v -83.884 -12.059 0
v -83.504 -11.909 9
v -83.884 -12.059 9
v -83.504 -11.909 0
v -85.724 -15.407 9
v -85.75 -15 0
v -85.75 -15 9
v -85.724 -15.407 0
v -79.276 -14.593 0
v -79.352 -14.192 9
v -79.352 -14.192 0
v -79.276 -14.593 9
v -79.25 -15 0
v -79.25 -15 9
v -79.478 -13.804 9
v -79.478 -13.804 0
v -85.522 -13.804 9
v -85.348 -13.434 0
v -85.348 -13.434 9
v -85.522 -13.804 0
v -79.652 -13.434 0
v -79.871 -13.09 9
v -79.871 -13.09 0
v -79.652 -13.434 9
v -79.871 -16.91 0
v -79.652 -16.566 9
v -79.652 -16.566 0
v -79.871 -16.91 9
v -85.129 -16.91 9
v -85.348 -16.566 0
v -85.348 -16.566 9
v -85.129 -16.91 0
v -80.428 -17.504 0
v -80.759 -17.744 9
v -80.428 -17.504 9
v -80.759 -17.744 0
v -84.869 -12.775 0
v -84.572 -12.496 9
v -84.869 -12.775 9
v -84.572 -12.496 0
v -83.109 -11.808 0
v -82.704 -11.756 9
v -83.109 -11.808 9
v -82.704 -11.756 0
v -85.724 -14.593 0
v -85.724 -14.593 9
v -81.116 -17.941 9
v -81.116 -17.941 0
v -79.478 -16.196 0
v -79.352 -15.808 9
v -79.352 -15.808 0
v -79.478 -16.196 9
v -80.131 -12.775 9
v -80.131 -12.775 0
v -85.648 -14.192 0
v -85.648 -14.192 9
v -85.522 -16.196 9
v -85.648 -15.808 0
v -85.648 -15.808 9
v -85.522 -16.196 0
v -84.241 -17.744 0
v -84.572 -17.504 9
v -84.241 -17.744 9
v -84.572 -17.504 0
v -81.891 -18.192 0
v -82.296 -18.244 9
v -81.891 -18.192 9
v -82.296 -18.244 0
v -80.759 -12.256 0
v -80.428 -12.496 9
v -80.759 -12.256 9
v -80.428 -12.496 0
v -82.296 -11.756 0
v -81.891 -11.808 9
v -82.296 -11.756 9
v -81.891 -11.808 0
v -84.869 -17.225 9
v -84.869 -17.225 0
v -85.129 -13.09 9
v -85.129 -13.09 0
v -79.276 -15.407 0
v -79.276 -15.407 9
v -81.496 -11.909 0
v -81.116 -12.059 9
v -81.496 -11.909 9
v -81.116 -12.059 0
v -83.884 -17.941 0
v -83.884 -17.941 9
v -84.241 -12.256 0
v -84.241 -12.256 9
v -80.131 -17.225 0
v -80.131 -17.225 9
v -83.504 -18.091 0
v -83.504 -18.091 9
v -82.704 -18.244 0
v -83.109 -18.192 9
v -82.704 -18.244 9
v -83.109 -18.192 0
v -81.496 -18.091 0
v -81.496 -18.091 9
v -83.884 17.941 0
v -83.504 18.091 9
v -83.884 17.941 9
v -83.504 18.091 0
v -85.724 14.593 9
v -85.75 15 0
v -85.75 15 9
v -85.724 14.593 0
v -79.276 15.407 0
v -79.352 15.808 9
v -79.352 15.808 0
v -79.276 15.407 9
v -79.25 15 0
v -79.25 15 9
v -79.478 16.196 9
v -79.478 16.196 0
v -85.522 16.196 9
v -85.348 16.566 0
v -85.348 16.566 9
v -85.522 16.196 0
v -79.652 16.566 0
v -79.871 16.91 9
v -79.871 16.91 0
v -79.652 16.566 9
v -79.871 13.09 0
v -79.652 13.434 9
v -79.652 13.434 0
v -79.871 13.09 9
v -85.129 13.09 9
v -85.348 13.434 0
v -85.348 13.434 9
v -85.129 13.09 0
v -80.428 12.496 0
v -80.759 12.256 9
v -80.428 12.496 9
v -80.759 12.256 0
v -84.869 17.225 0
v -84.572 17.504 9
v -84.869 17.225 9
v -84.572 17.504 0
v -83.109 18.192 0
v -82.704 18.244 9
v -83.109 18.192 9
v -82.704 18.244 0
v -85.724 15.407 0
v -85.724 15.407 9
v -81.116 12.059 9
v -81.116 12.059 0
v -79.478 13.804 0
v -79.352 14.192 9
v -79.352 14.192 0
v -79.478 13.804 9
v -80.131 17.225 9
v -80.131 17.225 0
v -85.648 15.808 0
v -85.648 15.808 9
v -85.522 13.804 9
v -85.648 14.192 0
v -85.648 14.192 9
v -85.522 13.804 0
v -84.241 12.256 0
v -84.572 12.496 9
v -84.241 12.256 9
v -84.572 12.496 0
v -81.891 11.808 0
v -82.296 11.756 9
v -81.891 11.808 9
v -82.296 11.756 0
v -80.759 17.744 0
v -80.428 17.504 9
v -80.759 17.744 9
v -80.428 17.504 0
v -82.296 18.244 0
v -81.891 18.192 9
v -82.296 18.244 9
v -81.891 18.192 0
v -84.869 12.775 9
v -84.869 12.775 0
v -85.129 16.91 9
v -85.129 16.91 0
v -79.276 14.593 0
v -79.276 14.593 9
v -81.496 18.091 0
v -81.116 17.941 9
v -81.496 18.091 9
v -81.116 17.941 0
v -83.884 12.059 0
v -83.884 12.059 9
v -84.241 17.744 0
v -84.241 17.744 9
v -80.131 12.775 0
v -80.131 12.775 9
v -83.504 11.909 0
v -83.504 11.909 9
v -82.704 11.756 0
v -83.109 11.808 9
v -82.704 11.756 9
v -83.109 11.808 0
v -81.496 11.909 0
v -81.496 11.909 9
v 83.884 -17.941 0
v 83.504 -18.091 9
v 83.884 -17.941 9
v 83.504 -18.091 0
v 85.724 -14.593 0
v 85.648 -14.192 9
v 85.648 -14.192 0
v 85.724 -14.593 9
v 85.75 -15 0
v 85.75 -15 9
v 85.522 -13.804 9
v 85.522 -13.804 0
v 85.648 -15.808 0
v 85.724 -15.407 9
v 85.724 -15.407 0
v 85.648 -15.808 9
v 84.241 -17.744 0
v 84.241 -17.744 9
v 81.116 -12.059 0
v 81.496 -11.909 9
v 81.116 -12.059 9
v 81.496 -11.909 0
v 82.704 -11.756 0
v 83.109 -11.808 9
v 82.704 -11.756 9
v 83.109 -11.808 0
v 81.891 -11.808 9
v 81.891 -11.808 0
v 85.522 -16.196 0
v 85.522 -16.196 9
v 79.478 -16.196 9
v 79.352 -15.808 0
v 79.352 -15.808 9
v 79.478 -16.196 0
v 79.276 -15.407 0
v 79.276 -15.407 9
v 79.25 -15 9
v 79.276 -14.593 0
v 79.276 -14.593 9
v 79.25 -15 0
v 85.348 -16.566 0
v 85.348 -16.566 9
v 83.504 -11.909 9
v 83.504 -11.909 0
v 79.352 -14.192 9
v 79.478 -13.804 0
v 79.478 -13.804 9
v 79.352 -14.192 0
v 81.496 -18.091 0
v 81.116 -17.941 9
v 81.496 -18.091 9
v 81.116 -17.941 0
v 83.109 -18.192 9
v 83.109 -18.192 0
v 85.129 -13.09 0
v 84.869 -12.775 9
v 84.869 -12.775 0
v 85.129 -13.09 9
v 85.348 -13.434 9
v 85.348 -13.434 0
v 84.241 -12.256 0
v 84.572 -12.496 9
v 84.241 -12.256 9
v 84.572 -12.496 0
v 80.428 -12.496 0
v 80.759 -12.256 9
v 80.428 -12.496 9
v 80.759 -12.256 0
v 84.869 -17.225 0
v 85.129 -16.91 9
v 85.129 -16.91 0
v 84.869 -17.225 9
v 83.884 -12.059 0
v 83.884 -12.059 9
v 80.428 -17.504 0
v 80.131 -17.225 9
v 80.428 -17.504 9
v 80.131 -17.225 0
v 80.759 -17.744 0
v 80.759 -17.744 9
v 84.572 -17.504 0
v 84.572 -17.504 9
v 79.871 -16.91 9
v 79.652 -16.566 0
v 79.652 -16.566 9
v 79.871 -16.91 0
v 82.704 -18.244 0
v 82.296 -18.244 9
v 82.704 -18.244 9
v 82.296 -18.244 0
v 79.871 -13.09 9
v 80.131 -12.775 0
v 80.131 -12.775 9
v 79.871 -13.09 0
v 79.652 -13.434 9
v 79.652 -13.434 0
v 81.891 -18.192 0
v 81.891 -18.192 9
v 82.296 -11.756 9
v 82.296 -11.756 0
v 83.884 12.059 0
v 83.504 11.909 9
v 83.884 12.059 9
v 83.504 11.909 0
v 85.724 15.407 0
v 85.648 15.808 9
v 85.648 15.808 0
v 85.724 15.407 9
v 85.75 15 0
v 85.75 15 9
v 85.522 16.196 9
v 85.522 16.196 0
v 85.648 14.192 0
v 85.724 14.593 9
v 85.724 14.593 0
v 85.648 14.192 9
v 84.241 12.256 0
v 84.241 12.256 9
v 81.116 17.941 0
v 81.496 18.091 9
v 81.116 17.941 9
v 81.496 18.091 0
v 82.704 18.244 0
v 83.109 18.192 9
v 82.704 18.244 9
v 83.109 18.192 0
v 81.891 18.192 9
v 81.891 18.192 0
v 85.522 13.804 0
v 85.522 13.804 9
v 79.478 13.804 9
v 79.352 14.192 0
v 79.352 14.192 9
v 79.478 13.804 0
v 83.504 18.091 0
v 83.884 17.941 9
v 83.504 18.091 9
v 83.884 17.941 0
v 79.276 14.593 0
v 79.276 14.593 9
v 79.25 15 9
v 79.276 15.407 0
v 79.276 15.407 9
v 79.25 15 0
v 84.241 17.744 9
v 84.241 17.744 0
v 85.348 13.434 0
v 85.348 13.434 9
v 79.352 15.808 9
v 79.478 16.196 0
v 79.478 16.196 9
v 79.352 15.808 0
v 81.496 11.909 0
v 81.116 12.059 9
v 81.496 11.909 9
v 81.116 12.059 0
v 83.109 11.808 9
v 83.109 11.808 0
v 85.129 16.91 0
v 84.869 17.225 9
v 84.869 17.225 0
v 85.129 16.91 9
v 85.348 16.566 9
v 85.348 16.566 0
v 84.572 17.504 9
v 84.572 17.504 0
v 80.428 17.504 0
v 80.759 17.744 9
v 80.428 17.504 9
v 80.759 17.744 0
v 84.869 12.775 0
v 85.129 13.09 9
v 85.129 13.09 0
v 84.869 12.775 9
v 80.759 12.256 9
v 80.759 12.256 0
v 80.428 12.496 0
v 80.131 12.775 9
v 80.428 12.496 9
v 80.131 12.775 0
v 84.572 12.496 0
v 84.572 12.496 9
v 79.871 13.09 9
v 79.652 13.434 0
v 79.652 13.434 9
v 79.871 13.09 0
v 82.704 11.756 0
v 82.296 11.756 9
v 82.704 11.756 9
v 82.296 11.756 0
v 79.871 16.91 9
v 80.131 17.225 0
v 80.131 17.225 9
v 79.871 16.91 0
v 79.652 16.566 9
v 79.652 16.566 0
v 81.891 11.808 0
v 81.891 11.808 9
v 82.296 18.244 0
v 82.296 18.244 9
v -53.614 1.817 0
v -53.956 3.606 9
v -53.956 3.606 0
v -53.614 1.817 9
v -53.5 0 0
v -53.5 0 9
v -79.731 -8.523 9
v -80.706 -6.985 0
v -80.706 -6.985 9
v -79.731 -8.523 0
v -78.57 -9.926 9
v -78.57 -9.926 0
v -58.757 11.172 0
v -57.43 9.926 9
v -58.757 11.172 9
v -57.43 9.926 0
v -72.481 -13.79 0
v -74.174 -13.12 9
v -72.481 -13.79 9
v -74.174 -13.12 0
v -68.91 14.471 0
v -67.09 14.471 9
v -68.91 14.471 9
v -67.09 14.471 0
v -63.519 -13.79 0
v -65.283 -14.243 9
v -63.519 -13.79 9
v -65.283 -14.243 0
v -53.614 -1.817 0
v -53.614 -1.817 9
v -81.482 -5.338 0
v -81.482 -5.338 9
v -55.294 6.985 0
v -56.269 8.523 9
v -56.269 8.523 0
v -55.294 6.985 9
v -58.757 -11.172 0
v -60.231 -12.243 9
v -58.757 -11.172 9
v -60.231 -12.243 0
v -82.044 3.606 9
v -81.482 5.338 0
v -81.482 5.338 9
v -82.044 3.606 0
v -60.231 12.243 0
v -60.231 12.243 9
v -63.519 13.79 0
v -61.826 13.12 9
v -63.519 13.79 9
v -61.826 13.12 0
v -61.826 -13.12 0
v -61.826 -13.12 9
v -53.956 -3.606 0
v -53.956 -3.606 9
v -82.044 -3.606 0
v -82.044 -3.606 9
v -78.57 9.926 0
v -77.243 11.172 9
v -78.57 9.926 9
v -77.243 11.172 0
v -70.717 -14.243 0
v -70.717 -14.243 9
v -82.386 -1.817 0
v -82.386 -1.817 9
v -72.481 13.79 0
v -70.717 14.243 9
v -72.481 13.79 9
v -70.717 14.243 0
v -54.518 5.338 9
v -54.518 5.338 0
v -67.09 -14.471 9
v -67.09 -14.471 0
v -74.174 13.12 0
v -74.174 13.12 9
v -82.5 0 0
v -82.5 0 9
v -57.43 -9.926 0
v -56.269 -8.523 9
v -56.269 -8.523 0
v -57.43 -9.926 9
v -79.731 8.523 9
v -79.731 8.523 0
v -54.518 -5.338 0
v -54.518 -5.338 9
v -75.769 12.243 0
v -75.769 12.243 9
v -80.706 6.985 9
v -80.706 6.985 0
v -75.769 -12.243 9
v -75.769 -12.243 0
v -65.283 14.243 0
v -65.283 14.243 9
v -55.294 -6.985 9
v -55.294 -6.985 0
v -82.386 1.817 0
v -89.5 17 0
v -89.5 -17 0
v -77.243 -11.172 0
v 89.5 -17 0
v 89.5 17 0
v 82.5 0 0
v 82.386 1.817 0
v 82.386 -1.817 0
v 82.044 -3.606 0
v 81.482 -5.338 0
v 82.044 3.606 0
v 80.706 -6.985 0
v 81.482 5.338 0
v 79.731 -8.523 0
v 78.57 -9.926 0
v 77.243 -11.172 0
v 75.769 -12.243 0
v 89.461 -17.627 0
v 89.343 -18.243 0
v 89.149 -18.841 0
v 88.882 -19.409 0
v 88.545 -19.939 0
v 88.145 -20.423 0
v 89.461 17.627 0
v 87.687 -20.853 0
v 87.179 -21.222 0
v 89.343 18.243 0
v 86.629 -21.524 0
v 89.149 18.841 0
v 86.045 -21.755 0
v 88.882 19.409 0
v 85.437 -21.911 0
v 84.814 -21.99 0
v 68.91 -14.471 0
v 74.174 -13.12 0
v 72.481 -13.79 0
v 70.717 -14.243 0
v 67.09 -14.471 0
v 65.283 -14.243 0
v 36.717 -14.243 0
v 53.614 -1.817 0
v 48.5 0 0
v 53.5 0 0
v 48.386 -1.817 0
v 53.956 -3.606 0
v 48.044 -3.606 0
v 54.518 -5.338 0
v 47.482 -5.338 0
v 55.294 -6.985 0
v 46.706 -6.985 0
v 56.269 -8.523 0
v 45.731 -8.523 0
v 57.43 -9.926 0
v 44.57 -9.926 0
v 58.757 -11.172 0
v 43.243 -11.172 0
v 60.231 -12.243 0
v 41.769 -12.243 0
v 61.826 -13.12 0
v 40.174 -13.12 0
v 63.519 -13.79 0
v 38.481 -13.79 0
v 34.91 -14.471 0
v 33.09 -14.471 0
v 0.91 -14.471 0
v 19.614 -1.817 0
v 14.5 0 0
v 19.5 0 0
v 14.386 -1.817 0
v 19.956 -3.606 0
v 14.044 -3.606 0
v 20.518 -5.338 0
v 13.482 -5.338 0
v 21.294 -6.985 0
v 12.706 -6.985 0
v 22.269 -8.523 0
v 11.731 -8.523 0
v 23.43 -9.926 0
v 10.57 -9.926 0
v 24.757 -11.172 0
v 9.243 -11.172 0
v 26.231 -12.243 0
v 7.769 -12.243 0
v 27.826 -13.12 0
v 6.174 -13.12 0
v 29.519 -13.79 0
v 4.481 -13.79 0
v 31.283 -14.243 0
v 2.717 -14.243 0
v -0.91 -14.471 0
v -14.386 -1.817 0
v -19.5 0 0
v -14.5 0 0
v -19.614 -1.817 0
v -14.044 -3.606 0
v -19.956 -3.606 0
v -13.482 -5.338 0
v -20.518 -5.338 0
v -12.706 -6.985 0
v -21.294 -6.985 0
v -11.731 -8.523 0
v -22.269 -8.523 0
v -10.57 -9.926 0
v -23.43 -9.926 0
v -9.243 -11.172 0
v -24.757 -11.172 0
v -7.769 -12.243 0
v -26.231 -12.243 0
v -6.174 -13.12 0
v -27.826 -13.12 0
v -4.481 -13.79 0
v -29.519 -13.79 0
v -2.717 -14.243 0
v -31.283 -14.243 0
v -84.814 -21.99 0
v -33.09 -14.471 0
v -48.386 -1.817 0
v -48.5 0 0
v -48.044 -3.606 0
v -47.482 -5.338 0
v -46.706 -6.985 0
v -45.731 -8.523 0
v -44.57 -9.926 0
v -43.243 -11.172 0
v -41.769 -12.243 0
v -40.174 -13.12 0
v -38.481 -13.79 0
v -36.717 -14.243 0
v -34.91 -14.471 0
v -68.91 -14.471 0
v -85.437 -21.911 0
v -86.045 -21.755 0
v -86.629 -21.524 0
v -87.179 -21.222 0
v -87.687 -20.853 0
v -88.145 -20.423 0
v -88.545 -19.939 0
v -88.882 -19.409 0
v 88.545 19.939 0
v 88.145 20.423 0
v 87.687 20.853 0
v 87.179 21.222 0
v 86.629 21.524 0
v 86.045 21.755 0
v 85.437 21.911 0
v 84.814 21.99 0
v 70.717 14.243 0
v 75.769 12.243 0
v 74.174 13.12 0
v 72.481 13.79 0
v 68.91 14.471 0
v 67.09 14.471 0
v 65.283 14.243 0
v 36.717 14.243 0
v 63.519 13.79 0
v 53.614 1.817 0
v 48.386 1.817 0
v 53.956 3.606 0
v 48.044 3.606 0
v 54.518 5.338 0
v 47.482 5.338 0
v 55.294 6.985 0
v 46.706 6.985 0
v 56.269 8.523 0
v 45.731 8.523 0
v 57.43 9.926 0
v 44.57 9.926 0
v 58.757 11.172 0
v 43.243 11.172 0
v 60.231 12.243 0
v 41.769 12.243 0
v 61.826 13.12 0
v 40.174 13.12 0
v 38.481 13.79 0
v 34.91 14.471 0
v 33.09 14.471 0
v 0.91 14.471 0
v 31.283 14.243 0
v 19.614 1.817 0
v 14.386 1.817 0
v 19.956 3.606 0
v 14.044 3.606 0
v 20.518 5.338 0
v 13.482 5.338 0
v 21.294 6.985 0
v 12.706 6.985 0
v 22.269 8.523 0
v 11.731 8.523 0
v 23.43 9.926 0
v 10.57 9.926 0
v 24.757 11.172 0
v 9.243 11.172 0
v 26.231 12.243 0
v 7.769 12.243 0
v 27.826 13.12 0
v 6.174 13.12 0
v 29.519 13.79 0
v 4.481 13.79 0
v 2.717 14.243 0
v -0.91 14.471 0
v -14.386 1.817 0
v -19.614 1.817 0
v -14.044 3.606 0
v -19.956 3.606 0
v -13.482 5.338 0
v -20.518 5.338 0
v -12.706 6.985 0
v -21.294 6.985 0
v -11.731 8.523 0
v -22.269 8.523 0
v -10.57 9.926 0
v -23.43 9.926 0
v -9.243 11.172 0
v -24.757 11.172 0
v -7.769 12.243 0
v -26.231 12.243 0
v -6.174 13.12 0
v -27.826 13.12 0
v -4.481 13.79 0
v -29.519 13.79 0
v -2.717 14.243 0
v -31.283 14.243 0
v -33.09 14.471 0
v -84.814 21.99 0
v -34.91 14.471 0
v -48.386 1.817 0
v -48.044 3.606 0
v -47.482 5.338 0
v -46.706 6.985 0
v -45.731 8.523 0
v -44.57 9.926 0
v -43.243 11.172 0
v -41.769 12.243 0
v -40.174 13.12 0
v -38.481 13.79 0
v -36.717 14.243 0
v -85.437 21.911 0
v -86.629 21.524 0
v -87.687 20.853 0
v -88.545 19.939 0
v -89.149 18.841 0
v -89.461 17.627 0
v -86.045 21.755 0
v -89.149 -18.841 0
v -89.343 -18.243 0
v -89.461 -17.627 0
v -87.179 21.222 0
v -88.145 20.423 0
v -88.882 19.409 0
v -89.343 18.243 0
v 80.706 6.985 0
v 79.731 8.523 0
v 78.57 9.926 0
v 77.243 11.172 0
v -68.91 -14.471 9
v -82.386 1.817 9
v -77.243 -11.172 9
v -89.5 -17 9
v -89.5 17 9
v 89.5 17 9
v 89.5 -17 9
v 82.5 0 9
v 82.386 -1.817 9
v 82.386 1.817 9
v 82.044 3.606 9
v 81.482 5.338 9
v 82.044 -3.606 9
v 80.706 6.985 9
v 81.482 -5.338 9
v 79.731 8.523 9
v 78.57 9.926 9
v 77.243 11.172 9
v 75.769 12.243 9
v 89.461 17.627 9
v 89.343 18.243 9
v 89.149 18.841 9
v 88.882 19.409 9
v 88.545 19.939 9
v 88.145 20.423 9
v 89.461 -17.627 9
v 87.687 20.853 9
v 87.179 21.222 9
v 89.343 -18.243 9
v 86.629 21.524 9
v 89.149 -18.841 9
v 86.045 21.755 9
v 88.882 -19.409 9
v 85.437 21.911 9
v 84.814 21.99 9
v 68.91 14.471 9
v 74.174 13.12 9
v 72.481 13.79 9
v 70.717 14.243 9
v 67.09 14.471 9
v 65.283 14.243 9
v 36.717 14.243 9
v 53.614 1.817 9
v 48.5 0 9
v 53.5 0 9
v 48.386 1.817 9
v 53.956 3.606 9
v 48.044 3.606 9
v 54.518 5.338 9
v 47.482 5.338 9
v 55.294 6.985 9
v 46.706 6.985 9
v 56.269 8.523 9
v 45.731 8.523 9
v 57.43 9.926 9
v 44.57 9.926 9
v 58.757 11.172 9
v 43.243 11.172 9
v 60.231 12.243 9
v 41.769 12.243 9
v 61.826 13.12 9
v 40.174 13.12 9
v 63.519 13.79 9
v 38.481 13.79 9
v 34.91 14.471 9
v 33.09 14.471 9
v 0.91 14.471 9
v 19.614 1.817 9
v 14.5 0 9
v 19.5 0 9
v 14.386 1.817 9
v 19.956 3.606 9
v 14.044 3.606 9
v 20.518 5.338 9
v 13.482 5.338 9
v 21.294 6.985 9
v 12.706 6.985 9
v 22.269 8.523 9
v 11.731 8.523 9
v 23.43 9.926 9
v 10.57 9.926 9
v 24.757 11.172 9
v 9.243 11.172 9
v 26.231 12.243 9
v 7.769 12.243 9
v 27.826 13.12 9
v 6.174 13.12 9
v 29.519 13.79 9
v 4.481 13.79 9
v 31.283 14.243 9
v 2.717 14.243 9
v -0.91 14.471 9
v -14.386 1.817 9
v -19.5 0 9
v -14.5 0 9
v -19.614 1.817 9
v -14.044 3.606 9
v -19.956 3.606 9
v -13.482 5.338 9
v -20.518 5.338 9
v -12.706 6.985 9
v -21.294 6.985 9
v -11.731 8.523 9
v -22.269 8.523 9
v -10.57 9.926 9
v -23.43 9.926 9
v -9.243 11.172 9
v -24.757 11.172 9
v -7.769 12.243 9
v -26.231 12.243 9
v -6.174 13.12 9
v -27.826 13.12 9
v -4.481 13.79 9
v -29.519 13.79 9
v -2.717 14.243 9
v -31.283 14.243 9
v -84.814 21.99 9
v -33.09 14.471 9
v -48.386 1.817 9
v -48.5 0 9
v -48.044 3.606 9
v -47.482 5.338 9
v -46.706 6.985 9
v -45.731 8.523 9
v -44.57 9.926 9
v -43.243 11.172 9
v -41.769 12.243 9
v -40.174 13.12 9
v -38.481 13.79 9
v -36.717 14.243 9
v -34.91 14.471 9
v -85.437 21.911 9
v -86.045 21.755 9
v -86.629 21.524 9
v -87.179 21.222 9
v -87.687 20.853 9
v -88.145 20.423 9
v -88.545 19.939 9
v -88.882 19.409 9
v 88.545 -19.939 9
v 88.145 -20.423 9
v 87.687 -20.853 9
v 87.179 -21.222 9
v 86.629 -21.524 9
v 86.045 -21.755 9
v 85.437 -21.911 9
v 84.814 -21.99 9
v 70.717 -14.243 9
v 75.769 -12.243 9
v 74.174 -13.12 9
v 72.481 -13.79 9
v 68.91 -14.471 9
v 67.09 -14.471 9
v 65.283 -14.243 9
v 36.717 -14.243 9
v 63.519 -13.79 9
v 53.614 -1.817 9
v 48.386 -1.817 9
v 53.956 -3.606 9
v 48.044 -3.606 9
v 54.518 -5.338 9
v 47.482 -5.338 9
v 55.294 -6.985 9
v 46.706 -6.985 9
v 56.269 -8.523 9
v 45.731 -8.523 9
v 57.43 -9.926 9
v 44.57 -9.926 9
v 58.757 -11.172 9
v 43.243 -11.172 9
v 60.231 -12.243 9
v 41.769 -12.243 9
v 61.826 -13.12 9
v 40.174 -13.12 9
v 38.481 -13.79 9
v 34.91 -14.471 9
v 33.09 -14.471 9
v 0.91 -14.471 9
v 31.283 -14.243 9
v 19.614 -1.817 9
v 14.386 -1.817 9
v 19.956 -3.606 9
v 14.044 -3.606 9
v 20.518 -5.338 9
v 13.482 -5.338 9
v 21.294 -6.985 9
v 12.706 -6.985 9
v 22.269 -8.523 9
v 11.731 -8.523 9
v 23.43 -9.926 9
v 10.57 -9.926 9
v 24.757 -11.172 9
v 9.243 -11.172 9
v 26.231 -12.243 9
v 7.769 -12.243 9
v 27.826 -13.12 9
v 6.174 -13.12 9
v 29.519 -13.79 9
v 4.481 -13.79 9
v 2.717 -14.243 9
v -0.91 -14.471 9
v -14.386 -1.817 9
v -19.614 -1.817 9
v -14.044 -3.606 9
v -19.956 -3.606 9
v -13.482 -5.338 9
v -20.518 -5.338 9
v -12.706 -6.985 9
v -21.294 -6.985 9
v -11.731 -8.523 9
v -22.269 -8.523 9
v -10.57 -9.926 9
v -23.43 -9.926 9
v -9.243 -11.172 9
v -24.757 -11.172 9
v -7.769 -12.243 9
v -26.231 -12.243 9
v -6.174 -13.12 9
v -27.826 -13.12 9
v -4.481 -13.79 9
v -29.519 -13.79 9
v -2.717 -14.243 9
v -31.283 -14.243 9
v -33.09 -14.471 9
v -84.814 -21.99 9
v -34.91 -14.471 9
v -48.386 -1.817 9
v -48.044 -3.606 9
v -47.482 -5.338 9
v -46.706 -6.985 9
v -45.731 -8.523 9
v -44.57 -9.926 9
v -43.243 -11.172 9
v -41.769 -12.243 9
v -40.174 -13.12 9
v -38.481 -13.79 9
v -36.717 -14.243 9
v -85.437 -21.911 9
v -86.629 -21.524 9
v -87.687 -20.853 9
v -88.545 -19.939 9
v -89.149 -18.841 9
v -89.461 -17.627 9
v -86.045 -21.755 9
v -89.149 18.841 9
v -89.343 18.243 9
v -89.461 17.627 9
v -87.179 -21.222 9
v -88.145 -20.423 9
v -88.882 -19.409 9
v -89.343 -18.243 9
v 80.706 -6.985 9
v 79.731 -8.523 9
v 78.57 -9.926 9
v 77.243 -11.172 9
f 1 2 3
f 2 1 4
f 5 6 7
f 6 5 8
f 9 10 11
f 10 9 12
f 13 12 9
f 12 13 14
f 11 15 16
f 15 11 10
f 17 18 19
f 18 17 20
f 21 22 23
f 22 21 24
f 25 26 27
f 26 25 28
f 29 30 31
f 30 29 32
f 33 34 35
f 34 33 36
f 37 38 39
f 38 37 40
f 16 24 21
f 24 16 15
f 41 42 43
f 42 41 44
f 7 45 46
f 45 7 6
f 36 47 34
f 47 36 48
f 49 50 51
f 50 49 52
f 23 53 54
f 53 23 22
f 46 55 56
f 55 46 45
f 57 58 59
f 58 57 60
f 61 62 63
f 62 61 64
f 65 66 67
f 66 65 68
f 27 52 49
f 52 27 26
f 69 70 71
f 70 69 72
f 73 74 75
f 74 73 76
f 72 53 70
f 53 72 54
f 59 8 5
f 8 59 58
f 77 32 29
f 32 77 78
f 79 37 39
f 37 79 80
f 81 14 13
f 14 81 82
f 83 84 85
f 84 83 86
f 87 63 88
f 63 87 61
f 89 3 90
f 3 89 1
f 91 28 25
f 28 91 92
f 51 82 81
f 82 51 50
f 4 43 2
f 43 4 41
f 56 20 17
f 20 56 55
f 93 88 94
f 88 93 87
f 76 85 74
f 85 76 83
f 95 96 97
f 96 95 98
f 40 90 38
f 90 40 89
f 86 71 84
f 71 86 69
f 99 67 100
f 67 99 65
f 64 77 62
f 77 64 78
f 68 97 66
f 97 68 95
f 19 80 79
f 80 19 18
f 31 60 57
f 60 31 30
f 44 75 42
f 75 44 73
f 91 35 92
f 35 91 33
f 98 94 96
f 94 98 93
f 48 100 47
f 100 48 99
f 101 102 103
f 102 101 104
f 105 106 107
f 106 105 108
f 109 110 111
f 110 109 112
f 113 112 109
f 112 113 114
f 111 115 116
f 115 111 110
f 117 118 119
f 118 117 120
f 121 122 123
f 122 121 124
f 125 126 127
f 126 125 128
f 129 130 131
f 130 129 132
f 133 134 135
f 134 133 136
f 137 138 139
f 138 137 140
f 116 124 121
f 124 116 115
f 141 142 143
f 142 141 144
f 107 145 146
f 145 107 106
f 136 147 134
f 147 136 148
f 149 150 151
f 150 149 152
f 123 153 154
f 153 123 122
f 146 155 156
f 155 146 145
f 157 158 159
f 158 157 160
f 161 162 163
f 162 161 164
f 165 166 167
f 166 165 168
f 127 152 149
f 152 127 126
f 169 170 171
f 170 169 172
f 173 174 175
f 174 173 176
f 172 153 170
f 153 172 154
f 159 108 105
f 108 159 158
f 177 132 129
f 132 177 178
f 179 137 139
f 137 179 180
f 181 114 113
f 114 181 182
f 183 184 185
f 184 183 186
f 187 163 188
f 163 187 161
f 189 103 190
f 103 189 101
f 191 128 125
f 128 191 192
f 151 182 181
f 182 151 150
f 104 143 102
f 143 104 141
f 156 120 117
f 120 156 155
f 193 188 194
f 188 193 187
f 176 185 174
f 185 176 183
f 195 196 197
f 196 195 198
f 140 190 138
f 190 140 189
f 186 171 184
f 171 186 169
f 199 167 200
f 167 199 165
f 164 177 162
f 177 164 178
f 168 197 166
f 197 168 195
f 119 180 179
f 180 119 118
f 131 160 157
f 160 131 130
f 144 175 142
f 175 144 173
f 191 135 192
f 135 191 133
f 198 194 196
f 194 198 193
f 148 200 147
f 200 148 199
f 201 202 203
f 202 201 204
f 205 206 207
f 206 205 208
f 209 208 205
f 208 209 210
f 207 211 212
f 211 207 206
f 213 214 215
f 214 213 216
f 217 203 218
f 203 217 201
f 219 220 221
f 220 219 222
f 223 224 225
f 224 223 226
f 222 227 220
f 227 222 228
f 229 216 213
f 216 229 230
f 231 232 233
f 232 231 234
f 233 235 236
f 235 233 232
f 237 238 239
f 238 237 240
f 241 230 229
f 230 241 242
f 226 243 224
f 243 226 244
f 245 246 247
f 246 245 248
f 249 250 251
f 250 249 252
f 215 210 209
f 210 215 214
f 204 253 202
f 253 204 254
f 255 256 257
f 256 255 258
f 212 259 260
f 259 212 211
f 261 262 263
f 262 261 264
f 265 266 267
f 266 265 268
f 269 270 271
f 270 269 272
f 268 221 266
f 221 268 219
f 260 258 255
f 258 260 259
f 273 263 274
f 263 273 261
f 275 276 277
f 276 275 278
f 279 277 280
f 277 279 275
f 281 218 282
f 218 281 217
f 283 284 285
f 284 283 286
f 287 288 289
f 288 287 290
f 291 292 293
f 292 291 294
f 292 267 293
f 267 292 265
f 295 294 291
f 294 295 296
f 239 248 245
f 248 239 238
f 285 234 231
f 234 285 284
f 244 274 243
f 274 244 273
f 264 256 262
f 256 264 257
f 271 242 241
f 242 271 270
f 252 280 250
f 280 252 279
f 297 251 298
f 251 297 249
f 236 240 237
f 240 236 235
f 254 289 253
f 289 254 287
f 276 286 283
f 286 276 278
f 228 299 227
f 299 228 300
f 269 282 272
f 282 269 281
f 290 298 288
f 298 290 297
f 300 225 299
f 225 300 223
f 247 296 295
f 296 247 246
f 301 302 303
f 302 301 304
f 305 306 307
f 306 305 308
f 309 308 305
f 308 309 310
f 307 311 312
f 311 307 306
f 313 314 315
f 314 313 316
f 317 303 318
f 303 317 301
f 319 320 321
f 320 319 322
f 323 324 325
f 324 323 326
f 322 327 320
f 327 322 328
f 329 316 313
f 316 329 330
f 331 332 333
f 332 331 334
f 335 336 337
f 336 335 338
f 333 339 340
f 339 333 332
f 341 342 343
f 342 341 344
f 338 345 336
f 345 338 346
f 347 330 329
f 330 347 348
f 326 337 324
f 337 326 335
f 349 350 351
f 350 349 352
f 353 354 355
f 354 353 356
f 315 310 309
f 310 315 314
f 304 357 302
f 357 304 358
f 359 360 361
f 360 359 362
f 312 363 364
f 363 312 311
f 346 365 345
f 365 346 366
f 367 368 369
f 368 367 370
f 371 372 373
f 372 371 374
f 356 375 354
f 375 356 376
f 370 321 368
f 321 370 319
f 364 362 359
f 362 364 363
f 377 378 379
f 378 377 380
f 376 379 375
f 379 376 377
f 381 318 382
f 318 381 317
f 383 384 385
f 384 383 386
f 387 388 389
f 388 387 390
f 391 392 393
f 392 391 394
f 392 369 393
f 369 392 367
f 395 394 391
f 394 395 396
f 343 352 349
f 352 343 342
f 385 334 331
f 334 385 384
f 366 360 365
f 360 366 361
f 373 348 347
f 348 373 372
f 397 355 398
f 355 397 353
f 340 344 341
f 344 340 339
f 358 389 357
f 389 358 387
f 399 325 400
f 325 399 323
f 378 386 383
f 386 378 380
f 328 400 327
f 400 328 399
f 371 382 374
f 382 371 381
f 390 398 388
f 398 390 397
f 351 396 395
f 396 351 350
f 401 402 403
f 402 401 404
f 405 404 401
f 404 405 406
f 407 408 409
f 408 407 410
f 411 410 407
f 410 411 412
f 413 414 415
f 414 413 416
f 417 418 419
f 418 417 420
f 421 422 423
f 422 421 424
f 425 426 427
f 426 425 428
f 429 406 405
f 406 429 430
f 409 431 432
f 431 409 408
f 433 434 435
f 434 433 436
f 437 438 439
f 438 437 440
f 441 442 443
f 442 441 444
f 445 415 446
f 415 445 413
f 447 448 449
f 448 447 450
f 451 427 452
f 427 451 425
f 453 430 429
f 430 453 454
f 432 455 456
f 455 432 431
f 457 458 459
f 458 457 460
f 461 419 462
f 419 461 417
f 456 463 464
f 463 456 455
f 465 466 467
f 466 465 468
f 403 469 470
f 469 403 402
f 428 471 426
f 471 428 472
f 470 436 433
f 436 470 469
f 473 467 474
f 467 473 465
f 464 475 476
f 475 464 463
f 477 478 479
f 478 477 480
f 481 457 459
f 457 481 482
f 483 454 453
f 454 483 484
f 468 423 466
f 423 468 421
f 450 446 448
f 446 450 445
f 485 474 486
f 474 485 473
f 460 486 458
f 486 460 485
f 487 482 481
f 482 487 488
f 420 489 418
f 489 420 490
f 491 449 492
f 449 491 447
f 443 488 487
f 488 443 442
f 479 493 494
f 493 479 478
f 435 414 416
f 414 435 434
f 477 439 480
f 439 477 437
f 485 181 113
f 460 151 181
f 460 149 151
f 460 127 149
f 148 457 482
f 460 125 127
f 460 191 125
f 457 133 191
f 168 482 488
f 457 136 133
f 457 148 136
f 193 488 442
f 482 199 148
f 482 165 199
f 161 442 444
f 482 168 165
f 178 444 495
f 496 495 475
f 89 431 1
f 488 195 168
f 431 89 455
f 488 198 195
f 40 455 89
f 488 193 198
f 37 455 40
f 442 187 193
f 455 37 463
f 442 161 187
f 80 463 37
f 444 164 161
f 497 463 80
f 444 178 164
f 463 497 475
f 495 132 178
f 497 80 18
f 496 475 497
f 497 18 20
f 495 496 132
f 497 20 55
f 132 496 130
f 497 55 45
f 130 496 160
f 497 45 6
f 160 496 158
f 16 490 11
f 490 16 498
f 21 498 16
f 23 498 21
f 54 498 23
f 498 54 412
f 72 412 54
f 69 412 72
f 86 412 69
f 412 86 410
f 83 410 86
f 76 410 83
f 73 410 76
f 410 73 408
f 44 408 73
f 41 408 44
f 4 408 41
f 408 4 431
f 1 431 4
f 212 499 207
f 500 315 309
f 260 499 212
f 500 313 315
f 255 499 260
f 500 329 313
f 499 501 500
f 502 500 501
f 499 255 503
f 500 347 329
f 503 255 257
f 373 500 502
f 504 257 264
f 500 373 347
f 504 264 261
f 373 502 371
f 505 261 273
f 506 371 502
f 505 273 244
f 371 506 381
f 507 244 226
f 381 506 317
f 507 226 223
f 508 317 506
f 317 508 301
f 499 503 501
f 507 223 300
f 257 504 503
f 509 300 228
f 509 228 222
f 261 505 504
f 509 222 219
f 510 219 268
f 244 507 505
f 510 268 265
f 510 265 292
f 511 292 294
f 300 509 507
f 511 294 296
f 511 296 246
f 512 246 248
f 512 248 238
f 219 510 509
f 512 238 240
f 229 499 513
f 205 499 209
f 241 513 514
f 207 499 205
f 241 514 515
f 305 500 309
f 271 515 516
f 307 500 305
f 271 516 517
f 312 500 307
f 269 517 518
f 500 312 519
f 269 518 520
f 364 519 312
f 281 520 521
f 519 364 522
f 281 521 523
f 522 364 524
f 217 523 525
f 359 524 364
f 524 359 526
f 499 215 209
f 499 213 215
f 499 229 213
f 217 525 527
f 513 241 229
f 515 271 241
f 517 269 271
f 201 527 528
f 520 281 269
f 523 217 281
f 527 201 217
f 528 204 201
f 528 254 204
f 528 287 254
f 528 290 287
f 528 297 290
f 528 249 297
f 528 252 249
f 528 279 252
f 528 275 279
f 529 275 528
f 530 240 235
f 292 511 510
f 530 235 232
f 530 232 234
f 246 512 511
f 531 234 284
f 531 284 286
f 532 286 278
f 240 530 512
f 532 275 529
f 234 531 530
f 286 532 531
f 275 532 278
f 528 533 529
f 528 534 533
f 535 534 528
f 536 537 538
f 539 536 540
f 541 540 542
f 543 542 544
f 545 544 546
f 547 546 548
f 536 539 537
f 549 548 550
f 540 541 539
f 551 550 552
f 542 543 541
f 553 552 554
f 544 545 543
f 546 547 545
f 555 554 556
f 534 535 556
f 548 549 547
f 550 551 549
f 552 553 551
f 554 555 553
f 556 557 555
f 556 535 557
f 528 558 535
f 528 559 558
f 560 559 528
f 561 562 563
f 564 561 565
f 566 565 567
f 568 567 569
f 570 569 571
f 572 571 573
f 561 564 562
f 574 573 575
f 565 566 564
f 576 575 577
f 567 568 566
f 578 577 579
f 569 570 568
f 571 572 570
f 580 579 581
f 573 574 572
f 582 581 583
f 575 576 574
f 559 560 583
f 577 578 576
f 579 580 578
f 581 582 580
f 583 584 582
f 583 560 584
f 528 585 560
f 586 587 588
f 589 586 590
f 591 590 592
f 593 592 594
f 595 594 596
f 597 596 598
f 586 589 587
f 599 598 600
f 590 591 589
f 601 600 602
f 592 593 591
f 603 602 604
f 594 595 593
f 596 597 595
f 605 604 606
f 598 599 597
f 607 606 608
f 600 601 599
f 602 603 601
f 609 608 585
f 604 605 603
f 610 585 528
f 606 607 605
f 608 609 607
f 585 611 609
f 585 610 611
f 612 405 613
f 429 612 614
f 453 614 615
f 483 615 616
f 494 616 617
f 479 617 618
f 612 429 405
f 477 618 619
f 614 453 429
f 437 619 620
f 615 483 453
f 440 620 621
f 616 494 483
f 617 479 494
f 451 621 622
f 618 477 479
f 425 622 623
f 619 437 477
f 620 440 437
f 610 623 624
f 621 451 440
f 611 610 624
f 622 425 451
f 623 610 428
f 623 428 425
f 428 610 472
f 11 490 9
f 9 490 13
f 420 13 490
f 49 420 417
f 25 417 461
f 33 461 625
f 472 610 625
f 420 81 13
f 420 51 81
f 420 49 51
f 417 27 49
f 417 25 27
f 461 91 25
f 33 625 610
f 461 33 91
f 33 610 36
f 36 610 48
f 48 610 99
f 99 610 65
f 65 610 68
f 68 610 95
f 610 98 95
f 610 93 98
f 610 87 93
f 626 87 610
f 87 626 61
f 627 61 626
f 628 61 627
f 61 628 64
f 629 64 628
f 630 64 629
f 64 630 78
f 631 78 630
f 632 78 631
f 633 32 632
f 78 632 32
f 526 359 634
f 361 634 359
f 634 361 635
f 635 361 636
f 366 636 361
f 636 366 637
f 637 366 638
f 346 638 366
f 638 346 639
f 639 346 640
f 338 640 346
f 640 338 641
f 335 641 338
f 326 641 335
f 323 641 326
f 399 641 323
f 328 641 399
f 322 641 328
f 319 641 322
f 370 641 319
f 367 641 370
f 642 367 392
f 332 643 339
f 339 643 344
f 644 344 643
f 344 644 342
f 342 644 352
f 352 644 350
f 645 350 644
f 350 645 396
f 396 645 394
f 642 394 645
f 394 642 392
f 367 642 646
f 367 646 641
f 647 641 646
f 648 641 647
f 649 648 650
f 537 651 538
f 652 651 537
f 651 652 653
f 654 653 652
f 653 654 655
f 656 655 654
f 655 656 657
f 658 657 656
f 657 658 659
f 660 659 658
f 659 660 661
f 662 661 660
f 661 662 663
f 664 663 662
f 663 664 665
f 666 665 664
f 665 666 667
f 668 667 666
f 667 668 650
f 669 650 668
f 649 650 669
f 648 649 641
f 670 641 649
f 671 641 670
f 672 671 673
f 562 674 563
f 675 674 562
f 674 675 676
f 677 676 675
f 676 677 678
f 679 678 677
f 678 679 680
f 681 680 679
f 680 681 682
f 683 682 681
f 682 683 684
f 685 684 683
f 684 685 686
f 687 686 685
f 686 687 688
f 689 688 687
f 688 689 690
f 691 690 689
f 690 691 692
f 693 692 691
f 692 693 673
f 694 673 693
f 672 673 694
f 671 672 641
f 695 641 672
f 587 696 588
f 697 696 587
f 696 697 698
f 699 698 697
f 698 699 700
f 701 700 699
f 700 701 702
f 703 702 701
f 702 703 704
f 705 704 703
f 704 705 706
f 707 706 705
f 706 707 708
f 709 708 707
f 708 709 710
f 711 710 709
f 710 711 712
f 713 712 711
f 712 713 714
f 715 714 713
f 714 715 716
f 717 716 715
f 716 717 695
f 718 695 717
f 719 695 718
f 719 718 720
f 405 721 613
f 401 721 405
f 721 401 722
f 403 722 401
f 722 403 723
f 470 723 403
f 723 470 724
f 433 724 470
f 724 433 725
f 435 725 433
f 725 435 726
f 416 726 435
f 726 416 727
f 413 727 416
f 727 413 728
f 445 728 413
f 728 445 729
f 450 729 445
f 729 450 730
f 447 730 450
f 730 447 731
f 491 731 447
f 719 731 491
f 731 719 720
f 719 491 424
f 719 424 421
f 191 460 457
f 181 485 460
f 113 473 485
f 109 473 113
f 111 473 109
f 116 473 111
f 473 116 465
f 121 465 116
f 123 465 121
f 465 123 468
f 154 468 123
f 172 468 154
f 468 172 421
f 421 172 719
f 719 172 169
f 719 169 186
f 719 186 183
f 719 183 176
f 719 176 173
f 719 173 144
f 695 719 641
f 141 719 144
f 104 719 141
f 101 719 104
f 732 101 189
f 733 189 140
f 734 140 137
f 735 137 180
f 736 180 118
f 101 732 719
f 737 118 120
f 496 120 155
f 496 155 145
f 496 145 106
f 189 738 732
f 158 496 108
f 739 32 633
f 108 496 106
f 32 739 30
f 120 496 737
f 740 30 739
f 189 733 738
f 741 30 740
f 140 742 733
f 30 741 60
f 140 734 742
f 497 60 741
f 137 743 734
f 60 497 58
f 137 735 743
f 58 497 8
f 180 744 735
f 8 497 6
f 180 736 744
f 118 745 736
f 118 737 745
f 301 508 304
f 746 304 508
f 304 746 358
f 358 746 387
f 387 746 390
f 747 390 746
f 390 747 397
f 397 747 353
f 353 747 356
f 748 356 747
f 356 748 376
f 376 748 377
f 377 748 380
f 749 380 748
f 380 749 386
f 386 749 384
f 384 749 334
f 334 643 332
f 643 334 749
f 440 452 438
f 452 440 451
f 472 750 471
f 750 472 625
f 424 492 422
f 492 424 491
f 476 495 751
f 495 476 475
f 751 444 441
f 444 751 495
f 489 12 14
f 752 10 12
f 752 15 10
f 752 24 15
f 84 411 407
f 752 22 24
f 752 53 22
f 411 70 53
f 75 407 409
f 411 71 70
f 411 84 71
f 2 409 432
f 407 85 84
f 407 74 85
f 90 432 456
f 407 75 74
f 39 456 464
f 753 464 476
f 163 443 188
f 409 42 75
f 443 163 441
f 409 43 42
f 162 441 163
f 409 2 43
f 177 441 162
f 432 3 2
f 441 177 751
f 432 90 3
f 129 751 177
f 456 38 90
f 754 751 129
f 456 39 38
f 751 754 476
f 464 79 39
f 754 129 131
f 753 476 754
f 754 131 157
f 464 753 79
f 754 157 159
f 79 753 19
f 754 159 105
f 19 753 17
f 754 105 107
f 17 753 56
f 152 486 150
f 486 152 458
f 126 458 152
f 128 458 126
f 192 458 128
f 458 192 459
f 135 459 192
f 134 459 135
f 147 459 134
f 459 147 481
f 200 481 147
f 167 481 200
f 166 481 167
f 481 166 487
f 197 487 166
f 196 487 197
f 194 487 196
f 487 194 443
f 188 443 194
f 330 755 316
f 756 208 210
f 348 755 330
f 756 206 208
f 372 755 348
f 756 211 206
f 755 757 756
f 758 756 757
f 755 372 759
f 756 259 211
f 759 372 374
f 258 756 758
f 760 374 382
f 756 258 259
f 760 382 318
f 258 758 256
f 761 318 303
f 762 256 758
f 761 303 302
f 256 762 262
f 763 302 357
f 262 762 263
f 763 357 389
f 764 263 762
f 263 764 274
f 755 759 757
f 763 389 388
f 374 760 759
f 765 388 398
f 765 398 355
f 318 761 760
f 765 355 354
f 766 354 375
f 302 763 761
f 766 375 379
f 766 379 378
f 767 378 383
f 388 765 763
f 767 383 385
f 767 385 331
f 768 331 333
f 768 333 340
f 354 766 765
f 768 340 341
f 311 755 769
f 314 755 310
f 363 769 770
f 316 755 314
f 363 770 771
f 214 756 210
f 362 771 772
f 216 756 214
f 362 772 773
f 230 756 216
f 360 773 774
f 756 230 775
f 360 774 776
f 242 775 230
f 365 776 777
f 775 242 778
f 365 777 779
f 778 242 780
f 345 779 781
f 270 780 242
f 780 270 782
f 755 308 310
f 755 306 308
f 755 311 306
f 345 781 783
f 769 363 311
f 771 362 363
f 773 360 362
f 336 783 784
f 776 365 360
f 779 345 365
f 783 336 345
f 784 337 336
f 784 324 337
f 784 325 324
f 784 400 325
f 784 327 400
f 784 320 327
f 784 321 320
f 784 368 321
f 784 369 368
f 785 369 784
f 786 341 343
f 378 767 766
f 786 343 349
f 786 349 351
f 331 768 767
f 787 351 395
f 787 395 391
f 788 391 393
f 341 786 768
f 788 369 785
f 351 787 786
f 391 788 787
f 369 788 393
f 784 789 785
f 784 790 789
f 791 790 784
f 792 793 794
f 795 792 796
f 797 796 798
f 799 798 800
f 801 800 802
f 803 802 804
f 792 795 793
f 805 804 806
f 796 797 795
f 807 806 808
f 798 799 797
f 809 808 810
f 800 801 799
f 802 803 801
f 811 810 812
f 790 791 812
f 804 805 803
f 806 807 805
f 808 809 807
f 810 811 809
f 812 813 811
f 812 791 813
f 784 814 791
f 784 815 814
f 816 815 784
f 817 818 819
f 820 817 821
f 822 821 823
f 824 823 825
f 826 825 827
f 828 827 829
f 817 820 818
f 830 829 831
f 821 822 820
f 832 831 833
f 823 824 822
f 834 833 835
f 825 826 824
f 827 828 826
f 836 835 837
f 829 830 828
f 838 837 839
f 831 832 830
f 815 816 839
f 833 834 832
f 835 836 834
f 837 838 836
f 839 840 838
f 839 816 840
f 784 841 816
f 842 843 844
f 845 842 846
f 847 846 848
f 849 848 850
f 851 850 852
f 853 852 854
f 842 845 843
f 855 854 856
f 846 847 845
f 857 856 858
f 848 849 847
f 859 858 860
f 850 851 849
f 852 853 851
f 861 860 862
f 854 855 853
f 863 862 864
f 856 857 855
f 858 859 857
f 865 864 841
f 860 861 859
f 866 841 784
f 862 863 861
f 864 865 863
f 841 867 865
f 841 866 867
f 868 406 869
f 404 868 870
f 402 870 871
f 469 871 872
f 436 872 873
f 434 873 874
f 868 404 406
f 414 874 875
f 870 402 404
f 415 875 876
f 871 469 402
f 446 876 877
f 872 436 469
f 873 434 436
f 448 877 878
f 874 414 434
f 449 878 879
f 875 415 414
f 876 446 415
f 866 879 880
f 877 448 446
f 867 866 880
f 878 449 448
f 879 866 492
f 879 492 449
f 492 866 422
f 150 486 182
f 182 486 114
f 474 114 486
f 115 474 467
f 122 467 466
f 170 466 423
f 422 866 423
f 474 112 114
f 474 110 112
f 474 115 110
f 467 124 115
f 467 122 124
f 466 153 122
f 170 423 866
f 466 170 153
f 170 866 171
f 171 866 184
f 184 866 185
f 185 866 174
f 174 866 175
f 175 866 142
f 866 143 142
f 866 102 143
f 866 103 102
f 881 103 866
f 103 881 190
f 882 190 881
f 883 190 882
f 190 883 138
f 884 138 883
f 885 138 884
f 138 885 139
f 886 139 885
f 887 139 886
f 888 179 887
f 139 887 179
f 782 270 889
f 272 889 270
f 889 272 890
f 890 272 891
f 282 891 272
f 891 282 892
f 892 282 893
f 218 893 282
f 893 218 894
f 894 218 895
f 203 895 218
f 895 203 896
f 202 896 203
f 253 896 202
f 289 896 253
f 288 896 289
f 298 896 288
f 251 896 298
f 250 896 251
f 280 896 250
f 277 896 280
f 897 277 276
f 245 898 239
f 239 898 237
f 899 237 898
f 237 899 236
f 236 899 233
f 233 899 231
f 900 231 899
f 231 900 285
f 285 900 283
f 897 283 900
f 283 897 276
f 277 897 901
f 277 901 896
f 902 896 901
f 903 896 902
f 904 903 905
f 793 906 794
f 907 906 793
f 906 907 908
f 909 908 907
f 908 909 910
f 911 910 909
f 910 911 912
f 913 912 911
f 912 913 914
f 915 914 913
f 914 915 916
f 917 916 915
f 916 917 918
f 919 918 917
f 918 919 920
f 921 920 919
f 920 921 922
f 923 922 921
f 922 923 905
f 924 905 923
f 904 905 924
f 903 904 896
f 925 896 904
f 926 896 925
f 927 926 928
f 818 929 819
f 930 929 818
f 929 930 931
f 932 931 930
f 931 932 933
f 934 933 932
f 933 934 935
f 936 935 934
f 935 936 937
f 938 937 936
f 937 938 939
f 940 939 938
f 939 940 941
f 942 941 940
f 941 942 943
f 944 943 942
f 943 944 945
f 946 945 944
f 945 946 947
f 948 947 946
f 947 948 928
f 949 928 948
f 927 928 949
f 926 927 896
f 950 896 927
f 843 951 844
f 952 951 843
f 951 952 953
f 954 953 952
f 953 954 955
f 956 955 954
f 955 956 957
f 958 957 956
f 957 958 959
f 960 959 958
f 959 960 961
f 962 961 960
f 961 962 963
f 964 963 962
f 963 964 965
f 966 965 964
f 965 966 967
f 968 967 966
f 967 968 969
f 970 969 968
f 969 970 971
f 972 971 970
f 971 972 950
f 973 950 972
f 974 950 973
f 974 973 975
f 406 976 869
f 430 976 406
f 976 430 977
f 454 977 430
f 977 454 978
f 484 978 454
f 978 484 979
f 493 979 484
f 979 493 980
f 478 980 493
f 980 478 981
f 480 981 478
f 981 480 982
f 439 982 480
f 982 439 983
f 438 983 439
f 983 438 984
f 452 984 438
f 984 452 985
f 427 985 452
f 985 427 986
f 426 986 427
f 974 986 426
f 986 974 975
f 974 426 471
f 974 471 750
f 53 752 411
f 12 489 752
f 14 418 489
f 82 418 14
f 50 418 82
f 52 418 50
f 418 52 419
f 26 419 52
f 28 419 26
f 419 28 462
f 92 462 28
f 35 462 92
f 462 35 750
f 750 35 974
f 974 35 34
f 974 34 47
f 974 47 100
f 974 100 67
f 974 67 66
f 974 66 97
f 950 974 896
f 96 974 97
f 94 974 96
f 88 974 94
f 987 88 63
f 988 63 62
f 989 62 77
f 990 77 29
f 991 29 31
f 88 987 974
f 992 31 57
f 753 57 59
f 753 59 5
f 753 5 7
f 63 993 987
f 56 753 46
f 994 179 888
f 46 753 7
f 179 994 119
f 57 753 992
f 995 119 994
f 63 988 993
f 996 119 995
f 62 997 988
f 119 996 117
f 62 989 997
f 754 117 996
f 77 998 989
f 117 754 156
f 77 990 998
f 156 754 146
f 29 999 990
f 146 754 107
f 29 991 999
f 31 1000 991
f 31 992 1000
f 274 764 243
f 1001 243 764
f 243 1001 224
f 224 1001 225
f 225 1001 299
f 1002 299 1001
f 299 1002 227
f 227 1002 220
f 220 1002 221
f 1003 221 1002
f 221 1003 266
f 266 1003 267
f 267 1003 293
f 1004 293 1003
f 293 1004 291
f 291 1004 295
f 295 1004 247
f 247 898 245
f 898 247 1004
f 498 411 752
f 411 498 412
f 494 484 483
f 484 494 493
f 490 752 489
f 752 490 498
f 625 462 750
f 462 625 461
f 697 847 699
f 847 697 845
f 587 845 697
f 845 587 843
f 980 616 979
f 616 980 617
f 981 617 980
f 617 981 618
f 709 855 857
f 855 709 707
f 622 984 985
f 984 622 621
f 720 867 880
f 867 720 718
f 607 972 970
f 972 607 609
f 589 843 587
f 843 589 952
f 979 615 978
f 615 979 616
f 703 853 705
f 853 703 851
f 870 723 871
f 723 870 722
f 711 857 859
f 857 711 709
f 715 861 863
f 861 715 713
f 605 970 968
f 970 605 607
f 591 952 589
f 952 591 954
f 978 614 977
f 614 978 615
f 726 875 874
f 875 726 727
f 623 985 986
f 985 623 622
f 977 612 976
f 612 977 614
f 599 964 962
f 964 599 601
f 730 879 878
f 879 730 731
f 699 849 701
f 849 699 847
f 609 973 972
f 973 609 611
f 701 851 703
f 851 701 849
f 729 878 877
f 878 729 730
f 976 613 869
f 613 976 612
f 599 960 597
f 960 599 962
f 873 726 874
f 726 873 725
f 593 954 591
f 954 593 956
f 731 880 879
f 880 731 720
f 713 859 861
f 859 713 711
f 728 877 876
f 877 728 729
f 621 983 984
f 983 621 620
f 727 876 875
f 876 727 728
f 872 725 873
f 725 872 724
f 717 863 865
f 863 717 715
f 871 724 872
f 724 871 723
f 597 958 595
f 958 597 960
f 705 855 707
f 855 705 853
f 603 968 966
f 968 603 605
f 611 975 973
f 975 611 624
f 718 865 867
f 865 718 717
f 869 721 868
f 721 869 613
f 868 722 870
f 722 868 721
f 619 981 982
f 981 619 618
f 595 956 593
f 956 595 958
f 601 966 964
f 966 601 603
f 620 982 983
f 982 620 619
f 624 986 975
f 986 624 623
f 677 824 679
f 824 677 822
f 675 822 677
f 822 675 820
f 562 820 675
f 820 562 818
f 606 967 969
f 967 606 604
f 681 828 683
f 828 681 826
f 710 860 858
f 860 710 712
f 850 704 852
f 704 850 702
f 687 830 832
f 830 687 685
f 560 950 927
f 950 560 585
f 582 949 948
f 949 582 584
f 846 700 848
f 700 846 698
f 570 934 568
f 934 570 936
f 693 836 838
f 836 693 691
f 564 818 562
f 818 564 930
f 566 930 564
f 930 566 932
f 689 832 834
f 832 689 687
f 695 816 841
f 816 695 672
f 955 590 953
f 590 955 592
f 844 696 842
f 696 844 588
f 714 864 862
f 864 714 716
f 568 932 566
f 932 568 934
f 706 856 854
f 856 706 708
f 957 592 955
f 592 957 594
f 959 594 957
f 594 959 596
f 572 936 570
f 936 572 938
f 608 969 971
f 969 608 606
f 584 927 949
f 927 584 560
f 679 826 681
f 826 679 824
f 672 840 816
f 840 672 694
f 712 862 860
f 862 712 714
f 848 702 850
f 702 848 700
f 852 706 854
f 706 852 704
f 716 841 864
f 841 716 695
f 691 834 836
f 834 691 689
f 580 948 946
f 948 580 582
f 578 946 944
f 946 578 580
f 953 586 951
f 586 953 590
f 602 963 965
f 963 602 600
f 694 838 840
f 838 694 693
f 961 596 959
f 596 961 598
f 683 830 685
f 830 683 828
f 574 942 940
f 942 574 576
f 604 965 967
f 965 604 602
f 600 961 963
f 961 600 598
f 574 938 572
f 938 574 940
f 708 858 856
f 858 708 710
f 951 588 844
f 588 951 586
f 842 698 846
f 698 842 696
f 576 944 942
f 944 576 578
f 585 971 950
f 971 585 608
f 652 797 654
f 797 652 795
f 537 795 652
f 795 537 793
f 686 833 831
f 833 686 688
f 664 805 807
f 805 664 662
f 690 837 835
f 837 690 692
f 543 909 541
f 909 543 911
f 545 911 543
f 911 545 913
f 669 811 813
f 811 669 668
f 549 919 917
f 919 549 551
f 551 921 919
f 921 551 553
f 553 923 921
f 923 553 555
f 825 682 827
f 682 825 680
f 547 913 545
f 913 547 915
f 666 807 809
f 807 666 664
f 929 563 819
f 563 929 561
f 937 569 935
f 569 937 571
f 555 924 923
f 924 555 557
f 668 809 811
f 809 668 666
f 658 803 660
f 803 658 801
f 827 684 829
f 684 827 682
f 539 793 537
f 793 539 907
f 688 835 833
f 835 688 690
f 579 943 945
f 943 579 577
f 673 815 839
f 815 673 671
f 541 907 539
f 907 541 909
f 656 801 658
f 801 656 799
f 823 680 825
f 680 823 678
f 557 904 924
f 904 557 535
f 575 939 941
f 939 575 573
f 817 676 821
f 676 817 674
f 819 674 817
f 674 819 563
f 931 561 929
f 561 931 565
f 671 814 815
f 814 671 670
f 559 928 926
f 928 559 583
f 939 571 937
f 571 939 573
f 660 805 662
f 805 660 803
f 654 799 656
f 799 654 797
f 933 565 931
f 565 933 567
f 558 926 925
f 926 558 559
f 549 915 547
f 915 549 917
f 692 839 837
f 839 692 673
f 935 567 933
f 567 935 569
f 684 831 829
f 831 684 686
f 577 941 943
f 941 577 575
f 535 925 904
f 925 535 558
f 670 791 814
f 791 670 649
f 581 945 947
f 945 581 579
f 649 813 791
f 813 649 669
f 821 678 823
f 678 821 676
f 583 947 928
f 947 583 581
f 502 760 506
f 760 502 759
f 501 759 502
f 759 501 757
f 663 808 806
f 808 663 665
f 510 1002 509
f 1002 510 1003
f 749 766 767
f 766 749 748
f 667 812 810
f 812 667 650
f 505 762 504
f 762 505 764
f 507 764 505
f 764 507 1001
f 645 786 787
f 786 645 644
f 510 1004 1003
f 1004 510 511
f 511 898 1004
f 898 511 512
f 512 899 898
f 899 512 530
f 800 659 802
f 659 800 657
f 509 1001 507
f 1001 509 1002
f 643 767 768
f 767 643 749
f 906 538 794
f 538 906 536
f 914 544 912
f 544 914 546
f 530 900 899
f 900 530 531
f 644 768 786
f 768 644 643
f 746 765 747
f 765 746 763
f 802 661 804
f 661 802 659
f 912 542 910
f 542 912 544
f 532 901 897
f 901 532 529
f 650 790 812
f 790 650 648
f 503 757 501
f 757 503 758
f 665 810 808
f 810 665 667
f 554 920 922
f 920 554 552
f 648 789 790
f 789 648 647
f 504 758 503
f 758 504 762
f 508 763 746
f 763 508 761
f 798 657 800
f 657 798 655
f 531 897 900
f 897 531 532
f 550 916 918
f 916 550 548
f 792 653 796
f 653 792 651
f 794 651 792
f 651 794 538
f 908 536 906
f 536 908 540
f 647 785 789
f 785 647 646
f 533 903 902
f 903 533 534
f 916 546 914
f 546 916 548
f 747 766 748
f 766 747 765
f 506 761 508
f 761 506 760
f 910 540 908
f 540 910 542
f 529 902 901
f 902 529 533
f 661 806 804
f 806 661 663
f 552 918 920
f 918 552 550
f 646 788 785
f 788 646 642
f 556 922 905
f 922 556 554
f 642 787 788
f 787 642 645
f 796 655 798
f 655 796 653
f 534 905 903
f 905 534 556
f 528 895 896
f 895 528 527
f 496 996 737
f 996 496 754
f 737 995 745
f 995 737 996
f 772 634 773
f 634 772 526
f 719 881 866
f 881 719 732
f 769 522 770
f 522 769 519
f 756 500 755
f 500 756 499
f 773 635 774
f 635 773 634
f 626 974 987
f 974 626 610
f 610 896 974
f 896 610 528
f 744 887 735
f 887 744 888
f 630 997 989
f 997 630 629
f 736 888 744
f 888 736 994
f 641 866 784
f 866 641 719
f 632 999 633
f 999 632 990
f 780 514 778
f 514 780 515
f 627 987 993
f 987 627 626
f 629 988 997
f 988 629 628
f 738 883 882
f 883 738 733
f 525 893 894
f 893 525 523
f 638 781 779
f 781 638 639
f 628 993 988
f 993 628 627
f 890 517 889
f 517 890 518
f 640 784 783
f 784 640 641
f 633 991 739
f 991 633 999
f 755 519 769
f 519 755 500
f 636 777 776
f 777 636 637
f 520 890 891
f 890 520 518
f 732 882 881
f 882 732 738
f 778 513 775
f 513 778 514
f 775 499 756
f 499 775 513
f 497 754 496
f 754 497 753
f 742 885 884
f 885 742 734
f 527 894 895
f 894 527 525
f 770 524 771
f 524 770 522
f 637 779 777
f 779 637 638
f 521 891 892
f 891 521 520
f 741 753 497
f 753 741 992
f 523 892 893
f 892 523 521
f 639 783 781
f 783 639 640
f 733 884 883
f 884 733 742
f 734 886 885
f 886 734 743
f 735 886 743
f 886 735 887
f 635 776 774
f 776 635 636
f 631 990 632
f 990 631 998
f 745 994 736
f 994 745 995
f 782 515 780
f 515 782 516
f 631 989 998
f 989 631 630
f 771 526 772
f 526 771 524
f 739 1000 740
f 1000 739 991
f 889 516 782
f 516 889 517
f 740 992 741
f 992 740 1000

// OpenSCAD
$fn = 50;

difference() {
	union() {
		hull() {
			translate(v = [-84.5, 17.0, 0]) {
				cylinder(h = 9, r = 5);
			}
			translate(v = [84.5, 17.0, 0]) {
				cylinder(h = 9, r = 5);
			}
			translate(v = [-84.5, -17.0, 0]) {
				cylinder(h = 9, r = 5);
			}
			translate(v = [84.5, -17.0, 0]) {
				cylinder(h = 9, r = 5);
			}
		}
	}
	union() {
		translate(v = [-82.5, -15.0, -100.0]) {
			cylinder(h = 200, r = 3.25);
		}
		translate(v = [-82.5, 15.0, -100.0]) {
			cylinder(h = 200, r = 3.25);
		}
		translate(v = [82.5, -15.0, -100.0]) {
			cylinder(h = 200, r = 3.25);
		}
		translate(v = [82.5, 15.0, -100.0]) {
			cylinder(h = 200, r = 3.25);
		}
		translate(v = [-82.5, -15.0, -100.0]) {
			cylinder(h = 200, r = 1.8);
		}
		translate(v = [-82.5, 15.0, -100.0]) {
			cylinder(h = 200, r = 1.8);
		}
		translate(v = [82.5, -15.0, -100.0]) {
			cylinder(h = 200, r = 1.8);
		}
		translate(v = [82.5, 15.0, -100.0]) {
			cylinder(h = 200, r = 1.8);
		}
		translate(v = [-68.0, 0, 0.0]) {
			cylinder(h = 9, r = 14.5);
		}
		translate(v = [-34.0, 0, 0.0]) {
			cylinder(h = 9, r = 14.5);
		}
		cylinder(h = 9, r = 14.5);
		translate(v = [34.0, 0, 0.0]) {
			cylinder(h = 9, r = 14.5);
		}
		translate(v = [68.0, 0, 0.0]) {
			cylinder(h = 9, r = 14.5);
		}
	}
}
